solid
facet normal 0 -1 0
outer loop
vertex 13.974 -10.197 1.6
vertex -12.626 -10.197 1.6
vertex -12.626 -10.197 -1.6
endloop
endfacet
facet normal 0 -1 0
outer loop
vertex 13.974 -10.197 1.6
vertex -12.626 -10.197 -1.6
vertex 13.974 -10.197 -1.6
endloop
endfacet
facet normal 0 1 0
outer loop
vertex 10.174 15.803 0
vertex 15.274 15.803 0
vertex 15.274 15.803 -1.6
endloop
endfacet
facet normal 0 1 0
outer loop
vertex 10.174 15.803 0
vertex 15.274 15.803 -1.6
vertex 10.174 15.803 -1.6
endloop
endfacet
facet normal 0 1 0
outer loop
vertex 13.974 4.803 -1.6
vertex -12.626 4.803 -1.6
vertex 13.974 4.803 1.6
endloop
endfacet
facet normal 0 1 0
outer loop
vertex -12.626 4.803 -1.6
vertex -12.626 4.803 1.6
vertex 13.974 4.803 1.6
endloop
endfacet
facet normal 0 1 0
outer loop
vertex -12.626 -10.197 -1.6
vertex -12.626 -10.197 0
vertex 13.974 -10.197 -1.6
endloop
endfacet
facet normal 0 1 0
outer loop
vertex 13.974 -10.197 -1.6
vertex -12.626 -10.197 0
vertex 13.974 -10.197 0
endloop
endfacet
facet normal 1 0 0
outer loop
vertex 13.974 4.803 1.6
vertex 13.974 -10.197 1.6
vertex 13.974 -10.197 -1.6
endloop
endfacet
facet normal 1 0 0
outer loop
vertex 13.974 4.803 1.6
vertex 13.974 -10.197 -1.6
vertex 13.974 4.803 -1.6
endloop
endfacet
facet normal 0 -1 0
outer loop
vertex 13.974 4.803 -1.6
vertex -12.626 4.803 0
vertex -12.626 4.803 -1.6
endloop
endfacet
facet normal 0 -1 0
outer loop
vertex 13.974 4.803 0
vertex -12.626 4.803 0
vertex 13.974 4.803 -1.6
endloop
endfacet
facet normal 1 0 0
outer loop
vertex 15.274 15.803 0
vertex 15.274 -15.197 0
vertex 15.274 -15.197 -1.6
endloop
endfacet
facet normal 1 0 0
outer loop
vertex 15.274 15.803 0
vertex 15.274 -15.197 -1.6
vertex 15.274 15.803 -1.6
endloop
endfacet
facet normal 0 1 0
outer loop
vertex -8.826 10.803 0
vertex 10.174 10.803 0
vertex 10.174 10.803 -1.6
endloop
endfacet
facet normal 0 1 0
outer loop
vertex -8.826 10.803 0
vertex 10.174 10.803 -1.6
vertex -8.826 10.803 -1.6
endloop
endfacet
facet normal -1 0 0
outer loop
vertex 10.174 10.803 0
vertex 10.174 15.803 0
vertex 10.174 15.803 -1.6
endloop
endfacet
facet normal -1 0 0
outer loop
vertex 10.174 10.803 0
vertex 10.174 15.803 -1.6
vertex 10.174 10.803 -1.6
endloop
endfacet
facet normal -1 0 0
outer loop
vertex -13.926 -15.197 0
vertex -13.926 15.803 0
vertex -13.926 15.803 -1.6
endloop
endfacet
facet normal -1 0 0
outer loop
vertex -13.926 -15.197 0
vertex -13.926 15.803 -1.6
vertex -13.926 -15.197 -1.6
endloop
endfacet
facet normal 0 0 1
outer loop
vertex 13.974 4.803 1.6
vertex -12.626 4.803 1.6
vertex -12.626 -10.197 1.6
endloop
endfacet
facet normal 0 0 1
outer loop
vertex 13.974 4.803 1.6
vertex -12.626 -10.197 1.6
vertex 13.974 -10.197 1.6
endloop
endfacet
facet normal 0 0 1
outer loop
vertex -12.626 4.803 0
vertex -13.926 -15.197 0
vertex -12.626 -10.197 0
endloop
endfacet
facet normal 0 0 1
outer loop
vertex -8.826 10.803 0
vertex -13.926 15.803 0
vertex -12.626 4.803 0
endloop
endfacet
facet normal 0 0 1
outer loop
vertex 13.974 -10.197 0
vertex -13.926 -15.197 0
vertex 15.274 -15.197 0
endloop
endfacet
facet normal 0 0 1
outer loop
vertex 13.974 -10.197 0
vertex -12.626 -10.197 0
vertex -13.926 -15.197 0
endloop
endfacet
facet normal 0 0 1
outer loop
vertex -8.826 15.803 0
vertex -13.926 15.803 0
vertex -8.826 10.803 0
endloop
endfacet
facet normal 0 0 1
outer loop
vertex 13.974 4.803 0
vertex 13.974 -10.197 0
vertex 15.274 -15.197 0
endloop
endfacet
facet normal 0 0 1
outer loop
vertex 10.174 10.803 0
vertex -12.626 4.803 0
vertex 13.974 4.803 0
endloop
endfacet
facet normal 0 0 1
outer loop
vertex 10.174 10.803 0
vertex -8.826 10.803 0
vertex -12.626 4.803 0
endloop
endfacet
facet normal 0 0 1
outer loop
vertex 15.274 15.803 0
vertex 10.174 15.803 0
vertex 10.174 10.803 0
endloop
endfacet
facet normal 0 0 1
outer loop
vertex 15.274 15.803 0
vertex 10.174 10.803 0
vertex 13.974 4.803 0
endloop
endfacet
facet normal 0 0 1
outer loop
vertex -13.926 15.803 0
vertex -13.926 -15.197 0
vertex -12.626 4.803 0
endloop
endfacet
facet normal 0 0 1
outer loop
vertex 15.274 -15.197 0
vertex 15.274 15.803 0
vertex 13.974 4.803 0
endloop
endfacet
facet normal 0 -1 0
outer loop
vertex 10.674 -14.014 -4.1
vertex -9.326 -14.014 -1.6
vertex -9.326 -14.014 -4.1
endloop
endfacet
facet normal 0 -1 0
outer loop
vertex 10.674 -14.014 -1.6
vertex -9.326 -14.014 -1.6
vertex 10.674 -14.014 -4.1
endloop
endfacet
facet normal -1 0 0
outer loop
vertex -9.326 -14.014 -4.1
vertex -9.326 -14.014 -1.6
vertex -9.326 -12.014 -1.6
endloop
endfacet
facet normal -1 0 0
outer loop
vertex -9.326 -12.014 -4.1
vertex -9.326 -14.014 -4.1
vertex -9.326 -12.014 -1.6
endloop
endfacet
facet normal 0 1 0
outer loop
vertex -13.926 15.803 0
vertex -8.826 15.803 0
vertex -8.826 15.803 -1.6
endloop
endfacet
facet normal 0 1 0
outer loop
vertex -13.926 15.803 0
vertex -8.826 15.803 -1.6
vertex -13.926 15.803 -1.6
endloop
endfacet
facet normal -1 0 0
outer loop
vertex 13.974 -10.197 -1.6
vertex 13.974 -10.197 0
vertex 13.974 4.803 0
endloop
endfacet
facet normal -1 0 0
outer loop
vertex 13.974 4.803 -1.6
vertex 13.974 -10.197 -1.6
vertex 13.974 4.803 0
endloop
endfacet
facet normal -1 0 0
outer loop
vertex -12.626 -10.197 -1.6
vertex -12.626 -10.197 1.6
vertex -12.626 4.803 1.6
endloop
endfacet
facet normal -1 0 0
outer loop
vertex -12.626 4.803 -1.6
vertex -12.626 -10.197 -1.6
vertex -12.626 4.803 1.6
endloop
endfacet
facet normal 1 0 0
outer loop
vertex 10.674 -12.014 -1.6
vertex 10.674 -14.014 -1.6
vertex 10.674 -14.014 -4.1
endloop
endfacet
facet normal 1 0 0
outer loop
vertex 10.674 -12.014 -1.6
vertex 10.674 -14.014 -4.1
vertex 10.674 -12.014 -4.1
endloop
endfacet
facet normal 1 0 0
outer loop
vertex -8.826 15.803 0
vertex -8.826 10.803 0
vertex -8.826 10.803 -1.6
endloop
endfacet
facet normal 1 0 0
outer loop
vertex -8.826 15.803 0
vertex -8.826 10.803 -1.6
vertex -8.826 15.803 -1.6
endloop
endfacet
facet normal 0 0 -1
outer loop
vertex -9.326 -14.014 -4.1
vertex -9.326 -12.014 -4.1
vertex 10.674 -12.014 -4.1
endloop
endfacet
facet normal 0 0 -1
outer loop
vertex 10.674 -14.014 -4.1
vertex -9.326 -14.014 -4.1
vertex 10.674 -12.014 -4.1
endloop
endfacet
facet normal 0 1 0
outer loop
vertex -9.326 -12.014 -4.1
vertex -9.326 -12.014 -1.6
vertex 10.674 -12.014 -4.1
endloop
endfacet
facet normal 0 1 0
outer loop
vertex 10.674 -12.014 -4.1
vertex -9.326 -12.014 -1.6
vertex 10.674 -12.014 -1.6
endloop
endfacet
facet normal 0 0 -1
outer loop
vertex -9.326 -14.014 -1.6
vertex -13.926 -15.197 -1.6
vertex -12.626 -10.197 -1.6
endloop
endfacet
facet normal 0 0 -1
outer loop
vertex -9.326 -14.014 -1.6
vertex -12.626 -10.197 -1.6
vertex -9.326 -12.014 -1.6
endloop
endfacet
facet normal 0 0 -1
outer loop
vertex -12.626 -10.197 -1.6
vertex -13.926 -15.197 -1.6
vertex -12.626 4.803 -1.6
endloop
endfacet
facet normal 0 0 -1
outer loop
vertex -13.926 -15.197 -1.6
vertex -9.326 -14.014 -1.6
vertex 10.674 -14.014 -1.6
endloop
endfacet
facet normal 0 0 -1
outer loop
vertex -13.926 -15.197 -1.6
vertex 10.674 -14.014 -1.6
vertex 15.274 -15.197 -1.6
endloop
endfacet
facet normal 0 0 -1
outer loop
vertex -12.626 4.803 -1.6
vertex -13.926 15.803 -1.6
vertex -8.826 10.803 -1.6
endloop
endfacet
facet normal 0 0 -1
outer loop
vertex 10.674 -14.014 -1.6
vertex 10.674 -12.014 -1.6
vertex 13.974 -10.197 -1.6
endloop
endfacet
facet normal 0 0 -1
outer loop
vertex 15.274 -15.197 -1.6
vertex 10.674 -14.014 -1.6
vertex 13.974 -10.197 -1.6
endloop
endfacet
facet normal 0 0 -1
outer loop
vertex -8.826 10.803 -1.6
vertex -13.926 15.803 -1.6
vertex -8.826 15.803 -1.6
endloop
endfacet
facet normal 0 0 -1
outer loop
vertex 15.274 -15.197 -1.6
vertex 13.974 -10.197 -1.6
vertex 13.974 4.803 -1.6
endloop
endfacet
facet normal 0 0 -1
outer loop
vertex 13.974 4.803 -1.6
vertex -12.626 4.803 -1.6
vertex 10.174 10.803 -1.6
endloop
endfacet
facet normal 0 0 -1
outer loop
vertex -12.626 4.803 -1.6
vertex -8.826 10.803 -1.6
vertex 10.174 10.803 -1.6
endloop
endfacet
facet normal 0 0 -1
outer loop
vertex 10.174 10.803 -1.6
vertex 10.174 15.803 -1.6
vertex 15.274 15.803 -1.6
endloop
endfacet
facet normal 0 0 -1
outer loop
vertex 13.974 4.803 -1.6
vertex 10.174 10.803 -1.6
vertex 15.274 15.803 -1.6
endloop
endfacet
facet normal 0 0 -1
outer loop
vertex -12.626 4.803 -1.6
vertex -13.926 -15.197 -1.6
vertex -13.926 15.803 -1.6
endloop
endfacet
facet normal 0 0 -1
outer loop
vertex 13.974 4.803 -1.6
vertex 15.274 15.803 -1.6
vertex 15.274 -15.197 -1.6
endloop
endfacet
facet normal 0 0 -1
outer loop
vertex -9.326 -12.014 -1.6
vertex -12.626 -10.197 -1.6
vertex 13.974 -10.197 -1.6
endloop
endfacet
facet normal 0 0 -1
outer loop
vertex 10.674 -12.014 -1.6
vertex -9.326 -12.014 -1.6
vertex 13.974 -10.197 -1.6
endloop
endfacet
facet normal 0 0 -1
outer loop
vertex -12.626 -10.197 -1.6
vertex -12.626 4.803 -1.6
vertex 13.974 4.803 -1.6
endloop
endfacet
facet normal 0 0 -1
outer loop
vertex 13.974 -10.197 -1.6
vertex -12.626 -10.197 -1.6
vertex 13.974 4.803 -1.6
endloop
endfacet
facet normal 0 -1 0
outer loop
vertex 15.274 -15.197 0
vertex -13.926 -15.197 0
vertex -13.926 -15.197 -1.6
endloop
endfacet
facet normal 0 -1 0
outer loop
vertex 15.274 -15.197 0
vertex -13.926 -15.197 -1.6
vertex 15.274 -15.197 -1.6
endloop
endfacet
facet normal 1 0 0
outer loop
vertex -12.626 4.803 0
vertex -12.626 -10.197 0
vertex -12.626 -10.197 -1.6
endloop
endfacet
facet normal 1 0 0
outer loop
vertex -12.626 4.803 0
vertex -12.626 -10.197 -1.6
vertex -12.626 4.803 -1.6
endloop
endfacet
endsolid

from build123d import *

# Parameters (mm, degrees)
SKETCH_1_W      = 26.6
SKETCH_1_H      = 15
EXTRUDE_1_DEPTH = 1.6
SKETCH_1_3_W    = 26.6
SKETCH_1_3_H    = 15
EXTRUDE_2_DEPTH = 1.6
SKETCH_5_W      = 20
SKETCH_5_H      = 2
EXTRUDE_3_DEPTH = 4.1


with BuildPart() as part:
    # 草图1 → 凸台-拉伸1 (new, symmetric)
    with BuildSketch(Plane.XY):
        with Locations((0.674374762, -2.696596571)):
            Rectangle(SKETCH_1_W, SKETCH_1_H)
    extrude(amount=EXTRUDE_1_DEPTH, both=True)


with BuildPart() as body_2:
    # 草图1<3> → 凸台-拉伸2 (new body)
    with BuildSketch(Plane.XY):
        Polygon((-8.825625238, 15.803403429), (-13.925625238, 15.803403429), (-13.925625238, -15.196596571), (15.274374762, -15.196596571), (15.274374762, 15.803403429), (10.174374762, 15.803403429), (10.174374762, 10.803403429), (-8.825625238, 10.803403429), align=None)
        with Locations((0.674374762, -2.696596571)):
            Rectangle(SKETCH_1_3_W, SKETCH_1_3_H, mode=Mode.SUBTRACT)
    extrude(amount=-EXTRUDE_2_DEPTH)

    # 草图5 → 凸台-拉伸3 (add)
    with BuildSketch(Plane.XY):
        with Locations((0.674374762, -13.014499015)):
            Rectangle(SKETCH_5_W, SKETCH_5_H)
    extrude(amount=-EXTRUDE_3_DEPTH)


solid = Compound([part.part, body_2.part])
